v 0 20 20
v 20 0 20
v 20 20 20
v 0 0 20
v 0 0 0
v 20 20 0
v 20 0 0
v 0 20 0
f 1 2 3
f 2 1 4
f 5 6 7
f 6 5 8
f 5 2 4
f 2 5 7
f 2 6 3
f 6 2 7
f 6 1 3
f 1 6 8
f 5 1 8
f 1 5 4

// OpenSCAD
//
// Doubles things.

/* [Size] */
w = 10; // [1:20]

/* [Hidden] */

// onescad: lib.scad

function helper(x) = x * 2;

// onescad: mid.scad

function viaMid(x) = helper(x) + 1;

// onescad: main.scad

cube(helper(w));

echo(viaMid(2));
